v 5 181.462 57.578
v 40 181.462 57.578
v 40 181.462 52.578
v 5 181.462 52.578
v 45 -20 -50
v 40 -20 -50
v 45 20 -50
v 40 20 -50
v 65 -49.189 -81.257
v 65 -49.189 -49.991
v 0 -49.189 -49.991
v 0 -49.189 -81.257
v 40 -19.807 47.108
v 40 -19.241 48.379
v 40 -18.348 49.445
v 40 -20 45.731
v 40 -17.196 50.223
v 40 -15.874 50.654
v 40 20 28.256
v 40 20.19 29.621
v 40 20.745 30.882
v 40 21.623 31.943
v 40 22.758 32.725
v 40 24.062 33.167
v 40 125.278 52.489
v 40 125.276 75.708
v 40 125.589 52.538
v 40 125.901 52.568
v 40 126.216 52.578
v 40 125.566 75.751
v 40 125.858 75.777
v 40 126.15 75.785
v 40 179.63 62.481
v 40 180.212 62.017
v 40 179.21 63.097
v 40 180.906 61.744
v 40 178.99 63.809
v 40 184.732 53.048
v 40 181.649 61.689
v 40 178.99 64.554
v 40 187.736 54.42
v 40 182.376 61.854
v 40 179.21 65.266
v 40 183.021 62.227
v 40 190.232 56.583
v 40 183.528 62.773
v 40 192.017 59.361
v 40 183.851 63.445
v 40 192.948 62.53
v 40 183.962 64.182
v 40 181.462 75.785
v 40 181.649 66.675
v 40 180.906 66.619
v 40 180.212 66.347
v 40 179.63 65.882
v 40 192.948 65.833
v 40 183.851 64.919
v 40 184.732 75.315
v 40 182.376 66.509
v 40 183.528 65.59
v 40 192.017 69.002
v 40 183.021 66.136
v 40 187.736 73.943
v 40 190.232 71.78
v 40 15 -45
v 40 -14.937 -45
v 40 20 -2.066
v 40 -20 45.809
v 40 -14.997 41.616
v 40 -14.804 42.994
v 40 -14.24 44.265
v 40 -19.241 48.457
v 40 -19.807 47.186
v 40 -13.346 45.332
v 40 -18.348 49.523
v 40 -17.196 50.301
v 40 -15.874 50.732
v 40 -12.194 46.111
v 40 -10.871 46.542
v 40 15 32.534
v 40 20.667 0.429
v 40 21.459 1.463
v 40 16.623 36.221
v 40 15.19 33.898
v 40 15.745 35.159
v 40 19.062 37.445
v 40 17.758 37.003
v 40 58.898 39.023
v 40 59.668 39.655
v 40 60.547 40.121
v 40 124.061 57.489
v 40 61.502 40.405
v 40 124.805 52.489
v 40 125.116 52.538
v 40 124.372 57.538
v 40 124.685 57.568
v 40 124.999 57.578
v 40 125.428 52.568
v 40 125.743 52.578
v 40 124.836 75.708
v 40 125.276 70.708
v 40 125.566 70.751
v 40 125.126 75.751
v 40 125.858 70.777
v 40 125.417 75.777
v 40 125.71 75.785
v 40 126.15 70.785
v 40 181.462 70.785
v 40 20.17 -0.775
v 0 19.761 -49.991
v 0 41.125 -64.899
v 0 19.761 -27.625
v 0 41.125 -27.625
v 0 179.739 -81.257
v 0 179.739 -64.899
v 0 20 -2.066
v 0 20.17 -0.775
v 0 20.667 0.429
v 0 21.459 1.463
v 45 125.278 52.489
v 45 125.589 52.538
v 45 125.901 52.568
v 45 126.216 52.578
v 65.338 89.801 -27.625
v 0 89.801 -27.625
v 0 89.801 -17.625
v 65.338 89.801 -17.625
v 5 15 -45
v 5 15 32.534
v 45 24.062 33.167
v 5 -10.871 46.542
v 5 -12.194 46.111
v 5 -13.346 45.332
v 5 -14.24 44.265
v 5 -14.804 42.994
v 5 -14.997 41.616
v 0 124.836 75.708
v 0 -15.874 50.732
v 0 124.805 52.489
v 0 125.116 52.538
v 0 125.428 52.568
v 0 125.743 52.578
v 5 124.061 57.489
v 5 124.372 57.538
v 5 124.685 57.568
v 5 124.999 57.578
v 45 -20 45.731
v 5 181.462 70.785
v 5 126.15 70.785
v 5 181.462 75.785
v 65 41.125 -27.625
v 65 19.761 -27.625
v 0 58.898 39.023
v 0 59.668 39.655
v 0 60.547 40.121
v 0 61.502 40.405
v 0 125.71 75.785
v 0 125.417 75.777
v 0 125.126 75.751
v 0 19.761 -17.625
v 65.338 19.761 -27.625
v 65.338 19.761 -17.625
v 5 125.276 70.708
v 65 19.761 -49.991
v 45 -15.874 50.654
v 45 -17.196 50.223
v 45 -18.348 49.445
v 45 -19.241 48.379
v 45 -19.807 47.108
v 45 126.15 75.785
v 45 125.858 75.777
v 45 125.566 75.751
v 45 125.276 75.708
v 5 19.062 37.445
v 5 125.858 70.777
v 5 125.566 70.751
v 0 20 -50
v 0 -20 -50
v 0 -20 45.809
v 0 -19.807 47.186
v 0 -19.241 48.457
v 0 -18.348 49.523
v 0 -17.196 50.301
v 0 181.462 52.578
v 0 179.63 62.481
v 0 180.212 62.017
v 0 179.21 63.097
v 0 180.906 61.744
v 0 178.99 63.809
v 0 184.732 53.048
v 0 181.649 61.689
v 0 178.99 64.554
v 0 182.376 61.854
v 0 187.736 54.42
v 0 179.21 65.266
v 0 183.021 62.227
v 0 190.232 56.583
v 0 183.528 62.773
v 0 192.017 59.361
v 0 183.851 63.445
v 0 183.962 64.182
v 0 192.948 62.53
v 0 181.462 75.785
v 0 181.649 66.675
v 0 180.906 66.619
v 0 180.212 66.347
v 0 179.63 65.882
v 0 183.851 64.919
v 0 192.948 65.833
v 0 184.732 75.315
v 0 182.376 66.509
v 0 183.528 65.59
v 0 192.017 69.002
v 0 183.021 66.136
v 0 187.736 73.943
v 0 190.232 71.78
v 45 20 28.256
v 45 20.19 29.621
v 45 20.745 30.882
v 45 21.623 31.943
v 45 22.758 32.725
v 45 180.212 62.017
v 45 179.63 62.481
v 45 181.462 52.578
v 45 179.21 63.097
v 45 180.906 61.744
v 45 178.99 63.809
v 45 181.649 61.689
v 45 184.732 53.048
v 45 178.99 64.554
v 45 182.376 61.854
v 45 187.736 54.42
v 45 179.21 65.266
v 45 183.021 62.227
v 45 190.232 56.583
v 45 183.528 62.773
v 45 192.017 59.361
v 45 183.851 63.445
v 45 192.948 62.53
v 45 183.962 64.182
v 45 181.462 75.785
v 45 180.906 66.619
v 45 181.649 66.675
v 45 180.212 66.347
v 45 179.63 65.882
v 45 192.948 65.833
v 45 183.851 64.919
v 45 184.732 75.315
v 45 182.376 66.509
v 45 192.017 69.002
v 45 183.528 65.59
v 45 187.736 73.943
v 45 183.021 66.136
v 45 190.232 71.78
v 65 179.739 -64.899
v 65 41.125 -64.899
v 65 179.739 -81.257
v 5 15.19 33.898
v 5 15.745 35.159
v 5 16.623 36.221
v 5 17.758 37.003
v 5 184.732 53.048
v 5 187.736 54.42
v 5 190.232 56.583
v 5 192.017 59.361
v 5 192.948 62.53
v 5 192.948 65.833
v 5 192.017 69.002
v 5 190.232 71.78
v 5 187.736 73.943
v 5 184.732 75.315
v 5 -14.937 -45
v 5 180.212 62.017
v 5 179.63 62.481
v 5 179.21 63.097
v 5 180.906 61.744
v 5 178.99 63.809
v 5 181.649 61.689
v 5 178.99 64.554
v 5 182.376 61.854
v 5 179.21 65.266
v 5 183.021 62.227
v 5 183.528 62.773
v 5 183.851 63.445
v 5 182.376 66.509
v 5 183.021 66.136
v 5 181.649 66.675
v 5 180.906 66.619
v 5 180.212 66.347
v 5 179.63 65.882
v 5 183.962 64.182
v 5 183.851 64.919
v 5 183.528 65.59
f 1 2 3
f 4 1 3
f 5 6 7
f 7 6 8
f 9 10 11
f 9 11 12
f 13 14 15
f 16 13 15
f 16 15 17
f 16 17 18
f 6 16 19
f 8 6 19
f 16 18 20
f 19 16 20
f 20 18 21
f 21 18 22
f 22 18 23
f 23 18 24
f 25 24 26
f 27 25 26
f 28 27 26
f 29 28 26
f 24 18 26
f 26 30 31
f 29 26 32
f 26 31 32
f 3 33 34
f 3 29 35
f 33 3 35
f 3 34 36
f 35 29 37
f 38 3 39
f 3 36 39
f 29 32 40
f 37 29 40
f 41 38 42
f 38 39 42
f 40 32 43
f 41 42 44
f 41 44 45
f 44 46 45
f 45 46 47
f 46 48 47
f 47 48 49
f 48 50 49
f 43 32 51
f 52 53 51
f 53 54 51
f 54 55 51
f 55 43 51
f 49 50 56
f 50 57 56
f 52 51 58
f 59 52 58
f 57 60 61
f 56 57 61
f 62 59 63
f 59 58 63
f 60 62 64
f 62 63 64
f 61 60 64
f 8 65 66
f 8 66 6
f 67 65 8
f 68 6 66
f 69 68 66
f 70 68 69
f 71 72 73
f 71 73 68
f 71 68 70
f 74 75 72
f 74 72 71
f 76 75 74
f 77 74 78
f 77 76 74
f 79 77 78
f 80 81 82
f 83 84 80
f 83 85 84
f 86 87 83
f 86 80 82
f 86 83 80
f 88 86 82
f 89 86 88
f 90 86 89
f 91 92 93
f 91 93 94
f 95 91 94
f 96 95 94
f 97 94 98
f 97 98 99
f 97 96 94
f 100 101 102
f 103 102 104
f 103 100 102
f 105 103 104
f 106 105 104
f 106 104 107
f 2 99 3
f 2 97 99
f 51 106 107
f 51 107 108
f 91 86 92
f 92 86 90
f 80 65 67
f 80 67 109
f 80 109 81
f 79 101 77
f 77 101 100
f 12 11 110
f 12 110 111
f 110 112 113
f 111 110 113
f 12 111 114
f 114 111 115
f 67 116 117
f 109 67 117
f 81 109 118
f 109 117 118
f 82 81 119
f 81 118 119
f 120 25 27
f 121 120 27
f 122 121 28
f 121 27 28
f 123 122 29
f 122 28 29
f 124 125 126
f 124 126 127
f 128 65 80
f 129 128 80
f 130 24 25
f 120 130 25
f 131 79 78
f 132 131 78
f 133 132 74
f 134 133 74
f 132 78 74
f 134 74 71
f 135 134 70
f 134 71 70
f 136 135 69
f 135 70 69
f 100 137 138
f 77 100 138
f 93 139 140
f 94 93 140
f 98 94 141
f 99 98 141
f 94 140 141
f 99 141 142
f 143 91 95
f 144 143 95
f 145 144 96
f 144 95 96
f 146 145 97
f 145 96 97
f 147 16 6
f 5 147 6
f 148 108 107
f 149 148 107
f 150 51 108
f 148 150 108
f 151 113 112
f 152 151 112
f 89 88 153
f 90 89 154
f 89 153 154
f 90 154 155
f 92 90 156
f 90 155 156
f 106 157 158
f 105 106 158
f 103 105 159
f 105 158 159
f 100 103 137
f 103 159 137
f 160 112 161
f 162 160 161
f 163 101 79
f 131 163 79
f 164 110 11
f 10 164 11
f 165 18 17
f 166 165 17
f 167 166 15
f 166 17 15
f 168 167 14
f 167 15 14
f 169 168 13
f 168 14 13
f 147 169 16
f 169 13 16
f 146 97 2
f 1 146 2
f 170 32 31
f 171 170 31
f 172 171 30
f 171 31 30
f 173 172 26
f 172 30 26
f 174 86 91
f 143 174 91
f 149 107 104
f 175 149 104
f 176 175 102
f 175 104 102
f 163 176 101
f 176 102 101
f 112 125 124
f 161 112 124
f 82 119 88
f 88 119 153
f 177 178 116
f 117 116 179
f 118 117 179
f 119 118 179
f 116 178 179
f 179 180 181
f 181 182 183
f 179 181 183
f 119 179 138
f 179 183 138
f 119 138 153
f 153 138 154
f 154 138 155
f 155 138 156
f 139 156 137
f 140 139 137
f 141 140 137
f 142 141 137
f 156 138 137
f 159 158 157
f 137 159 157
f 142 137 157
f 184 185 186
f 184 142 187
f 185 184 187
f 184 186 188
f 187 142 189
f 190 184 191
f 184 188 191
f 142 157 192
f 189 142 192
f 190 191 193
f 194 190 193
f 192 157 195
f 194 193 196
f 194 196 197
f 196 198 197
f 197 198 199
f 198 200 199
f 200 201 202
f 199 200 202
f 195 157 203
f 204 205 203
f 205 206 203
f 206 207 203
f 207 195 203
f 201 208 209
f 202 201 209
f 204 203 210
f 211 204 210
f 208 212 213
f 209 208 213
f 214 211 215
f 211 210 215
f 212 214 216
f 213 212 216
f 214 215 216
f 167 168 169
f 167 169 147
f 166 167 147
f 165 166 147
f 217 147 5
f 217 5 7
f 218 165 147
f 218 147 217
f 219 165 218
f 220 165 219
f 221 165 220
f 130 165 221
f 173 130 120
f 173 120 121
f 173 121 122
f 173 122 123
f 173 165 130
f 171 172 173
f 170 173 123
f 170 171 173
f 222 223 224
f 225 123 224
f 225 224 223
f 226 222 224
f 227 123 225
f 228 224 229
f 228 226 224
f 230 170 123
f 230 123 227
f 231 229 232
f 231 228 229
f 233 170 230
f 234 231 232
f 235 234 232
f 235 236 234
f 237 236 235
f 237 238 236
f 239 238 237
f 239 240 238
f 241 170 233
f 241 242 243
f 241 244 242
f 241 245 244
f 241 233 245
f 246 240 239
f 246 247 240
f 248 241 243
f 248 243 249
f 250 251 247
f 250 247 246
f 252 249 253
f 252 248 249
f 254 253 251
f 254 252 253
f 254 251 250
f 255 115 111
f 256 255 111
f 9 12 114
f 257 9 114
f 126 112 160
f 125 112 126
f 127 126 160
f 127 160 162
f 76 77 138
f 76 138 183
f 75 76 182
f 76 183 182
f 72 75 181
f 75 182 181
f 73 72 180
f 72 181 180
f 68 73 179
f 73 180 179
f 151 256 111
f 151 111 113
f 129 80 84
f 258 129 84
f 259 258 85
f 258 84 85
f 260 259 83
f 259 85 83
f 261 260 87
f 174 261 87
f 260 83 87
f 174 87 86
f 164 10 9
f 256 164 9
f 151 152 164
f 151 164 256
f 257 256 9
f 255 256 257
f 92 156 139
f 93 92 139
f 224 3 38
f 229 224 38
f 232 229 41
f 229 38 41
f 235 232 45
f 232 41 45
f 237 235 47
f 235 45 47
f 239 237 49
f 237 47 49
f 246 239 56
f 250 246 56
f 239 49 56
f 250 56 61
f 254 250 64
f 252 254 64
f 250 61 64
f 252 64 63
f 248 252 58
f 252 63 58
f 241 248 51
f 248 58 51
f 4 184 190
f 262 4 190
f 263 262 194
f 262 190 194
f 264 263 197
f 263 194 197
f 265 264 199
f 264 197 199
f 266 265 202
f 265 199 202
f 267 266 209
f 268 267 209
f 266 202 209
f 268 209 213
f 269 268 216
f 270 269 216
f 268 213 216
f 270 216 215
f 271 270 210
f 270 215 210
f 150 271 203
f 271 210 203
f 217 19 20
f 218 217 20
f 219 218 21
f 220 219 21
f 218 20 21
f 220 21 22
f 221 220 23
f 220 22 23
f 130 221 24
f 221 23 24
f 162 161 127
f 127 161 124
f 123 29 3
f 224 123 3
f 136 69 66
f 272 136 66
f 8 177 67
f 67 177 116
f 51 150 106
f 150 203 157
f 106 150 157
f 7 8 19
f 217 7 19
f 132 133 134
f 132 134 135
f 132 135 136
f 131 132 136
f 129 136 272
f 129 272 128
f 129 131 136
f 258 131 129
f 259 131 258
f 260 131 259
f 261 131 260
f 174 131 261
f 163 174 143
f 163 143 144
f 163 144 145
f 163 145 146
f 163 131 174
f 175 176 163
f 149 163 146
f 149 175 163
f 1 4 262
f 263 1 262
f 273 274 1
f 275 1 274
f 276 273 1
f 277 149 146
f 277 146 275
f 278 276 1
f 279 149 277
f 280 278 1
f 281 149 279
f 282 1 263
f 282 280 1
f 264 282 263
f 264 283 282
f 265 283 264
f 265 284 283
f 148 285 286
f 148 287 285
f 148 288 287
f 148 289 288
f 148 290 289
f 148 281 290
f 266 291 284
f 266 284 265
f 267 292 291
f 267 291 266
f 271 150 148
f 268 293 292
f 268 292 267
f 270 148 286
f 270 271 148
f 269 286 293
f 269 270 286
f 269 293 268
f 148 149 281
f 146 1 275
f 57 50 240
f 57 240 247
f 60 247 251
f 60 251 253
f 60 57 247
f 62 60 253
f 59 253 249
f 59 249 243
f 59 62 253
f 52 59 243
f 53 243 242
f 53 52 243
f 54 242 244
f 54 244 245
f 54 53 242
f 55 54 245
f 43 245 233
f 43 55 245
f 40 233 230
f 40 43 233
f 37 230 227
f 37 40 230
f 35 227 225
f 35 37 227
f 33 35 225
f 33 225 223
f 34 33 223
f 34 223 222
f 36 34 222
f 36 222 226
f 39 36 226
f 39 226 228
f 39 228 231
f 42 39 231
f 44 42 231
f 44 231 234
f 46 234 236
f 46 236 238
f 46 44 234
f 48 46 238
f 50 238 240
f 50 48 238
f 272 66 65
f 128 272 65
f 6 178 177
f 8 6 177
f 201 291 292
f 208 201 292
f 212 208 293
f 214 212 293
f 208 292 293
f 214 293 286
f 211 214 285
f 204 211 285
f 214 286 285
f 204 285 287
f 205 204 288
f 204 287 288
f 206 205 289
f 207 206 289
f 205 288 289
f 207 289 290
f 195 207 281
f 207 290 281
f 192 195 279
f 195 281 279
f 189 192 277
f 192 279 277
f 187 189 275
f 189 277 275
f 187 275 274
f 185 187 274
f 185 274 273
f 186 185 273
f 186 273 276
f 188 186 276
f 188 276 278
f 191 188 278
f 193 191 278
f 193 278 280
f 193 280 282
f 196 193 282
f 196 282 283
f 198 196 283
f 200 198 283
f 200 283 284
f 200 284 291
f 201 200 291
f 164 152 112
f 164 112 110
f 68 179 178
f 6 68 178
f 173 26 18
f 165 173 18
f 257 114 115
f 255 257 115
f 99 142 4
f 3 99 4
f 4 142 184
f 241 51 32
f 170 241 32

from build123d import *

# Parameters (mm, degrees)
F1_DEPTH  = 40
F3_DEPTH  = 35
F5_DEPTH  = 35
F6_R      = 2.5
F7_DEPTH  = 5.001
F8_R      = 2.5
F9_DEPTH  = 5
F11_DEPTH = 65
F12_W     = 65.337941
F12_H     = 70.039435
F13_DEPTH = 10


with BuildPart() as f1:
    # F0 (on Right) → F1 (new body)
    with BuildSketch(Plane.YZ):
        with BuildLine():
            Line((-20, -50), (20, -50))
            Line((20, -50), (20, -2.066369))
            ThreePointArc((20, -2.066369), (20.379069, -0.156659), (21.458797, 1.463487))
            Line((21.458797, 1.463487), (58.898135, 39.023183))
            ThreePointArc((58.898135, 39.023183), (60.095847, 39.910119), (61.501771, 40.404637))
            Line((61.501771, 40.404637), (124.805093, 52.489212))
            ThreePointArc((124.805093, 52.489212), (125.271783, 52.55568), (125.742659, 52.577902))
            Line((125.742659, 52.577902), (181.462377, 52.577902))
            ThreePointArc((181.462377, 52.577902), (193.066088, 64.181613), (181.462377, 75.785324))
            Line((181.462377, 75.785324), (125.709989, 75.785324))
            ThreePointArc((125.709989, 75.785324), (125.271379, 75.766049), (124.83615, 75.708372))
            Line((124.83615, 75.708372), (-15.873841, 50.732392))
            ThreePointArc((-15.873841, 50.732392), (-18.832049, 49.021104), (-20, 45.809346))
            Line((-20, 45.809346), (-20, -50))
        make_face()
    extrude(amount=F1_DEPTH)

    # F2 (on face) → F3 (cut)
    with BuildSketch(Plane.YZ.offset(40)):
        with BuildLine():
            Line((125.276458, 70.708372), (-10.870951, 46.542251))
            ThreePointArc((-10.870951, 46.542251), (-13.830267, 44.829641), (-14.99711, 41.615754))
            Line((-14.99711, 41.615754), (-14.937373, -45.000002))
            Line((-14.937373, -45.000002), (15, -45.000002))
            Line((15, -45.000002), (15, 32.533664))
            ThreePointArc((15, 32.533664), (16.14722, 35.720525), (19.062433, 37.444974))
            Line((19.062433, 37.444974), (124.061316, 57.489212))
            ThreePointArc((124.061316, 57.489212), (124.528007, 57.55568), (124.998883, 57.577902))
            Line((124.998883, 57.577902), (181.462377, 57.577902))
            ThreePointArc((181.462377, 57.577902), (188.066088, 64.181613), (181.462377, 70.785324))
            Line((181.462377, 70.785324), (126.150297, 70.785324))
            ThreePointArc((126.150297, 70.785324), (125.711687, 70.766049), (125.276458, 70.708372))
        make_face()
    extrude(amount=-F3_DEPTH, mode=Mode.SUBTRACT)

    # F4 (on face) → F5 (cut)
    with BuildSketch(Plane.YZ.offset(40)):
        with BuildLine():
            ThreePointArc((181.462377, 52.577902), (193.066088, 64.181613), (181.462377, 75.785324))
            Line((181.462377, 75.785324), (181.462377, 52.577902))
        make_face()
    extrude(amount=-F5_DEPTH, mode=Mode.SUBTRACT)

    # F6 (on face) → F7 (cut, through all)
    with BuildSketch(Plane.YZ.offset(5)):
        with Locations((181.462377, 64.181613)):
            Circle(F6_R)
    extrude(amount=-F7_DEPTH, mode=Mode.SUBTRACT)


with BuildPart() as f9:
    # F8 (on face) → F9 (new body)
    with BuildSketch(Plane.YZ.offset(40)):
        with BuildLine():
            Line((24.062433, 33.167194), (125.278071, 52.489212))
            ThreePointArc((125.278071, 52.489212), (125.744762, 52.55568), (126.215638, 52.577902))
            Line((126.215638, 52.577902), (181.462377, 52.577902))
            ThreePointArc((181.462377, 52.577902), (193.066088, 64.181613), (181.462377, 75.785324))
            Line((181.462377, 75.785324), (126.150297, 75.785324))
            ThreePointArc((126.150297, 75.785324), (125.711687, 75.766049), (125.276458, 75.708372))
            Line((125.276458, 75.708372), (-15.873839, 50.65424))
            ThreePointArc((-15.873839, 50.65424), (-18.832049, 48.942952), (-20, 45.731192))
            Line((-20, 45.731192), (-20, -50))
            Line((-20, -50), (20, -50))
            Line((20, -50), (20, 28.255883))
            ThreePointArc((20, 28.255883), (21.14722, 31.442744), (24.062433, 33.167194))
        make_face()
        with Locations((181.462377, 64.181613)):
            Circle(F8_R, mode=Mode.SUBTRACT)
    extrude(amount=F9_DEPTH)


with BuildPart() as f11:
    # F10 (on Right) → F11 (new body)
    with BuildSketch(Plane.YZ):
        Polygon((19.761348, -27.624568), (19.761348, -49.990527), (-49.188843, -49.990527), (-49.188843, -81.256658), (179.739043, -81.256658), (179.739043, -64.899407), (41.124731, -64.899407), (41.124731, -27.624568), align=None)
    extrude(amount=F11_DEPTH)


with BuildPart() as f13:
    # F12 (on face) → F13 (new body)
    with BuildSketch(Plane.XY.offset(-27.624568)):
        with Locations((32.668971, 54.781065)):
            Rectangle(F12_W, F12_H)
    extrude(amount=F13_DEPTH)


solid = Compound([f1.part, f9.part, f11.part, f13.part])
